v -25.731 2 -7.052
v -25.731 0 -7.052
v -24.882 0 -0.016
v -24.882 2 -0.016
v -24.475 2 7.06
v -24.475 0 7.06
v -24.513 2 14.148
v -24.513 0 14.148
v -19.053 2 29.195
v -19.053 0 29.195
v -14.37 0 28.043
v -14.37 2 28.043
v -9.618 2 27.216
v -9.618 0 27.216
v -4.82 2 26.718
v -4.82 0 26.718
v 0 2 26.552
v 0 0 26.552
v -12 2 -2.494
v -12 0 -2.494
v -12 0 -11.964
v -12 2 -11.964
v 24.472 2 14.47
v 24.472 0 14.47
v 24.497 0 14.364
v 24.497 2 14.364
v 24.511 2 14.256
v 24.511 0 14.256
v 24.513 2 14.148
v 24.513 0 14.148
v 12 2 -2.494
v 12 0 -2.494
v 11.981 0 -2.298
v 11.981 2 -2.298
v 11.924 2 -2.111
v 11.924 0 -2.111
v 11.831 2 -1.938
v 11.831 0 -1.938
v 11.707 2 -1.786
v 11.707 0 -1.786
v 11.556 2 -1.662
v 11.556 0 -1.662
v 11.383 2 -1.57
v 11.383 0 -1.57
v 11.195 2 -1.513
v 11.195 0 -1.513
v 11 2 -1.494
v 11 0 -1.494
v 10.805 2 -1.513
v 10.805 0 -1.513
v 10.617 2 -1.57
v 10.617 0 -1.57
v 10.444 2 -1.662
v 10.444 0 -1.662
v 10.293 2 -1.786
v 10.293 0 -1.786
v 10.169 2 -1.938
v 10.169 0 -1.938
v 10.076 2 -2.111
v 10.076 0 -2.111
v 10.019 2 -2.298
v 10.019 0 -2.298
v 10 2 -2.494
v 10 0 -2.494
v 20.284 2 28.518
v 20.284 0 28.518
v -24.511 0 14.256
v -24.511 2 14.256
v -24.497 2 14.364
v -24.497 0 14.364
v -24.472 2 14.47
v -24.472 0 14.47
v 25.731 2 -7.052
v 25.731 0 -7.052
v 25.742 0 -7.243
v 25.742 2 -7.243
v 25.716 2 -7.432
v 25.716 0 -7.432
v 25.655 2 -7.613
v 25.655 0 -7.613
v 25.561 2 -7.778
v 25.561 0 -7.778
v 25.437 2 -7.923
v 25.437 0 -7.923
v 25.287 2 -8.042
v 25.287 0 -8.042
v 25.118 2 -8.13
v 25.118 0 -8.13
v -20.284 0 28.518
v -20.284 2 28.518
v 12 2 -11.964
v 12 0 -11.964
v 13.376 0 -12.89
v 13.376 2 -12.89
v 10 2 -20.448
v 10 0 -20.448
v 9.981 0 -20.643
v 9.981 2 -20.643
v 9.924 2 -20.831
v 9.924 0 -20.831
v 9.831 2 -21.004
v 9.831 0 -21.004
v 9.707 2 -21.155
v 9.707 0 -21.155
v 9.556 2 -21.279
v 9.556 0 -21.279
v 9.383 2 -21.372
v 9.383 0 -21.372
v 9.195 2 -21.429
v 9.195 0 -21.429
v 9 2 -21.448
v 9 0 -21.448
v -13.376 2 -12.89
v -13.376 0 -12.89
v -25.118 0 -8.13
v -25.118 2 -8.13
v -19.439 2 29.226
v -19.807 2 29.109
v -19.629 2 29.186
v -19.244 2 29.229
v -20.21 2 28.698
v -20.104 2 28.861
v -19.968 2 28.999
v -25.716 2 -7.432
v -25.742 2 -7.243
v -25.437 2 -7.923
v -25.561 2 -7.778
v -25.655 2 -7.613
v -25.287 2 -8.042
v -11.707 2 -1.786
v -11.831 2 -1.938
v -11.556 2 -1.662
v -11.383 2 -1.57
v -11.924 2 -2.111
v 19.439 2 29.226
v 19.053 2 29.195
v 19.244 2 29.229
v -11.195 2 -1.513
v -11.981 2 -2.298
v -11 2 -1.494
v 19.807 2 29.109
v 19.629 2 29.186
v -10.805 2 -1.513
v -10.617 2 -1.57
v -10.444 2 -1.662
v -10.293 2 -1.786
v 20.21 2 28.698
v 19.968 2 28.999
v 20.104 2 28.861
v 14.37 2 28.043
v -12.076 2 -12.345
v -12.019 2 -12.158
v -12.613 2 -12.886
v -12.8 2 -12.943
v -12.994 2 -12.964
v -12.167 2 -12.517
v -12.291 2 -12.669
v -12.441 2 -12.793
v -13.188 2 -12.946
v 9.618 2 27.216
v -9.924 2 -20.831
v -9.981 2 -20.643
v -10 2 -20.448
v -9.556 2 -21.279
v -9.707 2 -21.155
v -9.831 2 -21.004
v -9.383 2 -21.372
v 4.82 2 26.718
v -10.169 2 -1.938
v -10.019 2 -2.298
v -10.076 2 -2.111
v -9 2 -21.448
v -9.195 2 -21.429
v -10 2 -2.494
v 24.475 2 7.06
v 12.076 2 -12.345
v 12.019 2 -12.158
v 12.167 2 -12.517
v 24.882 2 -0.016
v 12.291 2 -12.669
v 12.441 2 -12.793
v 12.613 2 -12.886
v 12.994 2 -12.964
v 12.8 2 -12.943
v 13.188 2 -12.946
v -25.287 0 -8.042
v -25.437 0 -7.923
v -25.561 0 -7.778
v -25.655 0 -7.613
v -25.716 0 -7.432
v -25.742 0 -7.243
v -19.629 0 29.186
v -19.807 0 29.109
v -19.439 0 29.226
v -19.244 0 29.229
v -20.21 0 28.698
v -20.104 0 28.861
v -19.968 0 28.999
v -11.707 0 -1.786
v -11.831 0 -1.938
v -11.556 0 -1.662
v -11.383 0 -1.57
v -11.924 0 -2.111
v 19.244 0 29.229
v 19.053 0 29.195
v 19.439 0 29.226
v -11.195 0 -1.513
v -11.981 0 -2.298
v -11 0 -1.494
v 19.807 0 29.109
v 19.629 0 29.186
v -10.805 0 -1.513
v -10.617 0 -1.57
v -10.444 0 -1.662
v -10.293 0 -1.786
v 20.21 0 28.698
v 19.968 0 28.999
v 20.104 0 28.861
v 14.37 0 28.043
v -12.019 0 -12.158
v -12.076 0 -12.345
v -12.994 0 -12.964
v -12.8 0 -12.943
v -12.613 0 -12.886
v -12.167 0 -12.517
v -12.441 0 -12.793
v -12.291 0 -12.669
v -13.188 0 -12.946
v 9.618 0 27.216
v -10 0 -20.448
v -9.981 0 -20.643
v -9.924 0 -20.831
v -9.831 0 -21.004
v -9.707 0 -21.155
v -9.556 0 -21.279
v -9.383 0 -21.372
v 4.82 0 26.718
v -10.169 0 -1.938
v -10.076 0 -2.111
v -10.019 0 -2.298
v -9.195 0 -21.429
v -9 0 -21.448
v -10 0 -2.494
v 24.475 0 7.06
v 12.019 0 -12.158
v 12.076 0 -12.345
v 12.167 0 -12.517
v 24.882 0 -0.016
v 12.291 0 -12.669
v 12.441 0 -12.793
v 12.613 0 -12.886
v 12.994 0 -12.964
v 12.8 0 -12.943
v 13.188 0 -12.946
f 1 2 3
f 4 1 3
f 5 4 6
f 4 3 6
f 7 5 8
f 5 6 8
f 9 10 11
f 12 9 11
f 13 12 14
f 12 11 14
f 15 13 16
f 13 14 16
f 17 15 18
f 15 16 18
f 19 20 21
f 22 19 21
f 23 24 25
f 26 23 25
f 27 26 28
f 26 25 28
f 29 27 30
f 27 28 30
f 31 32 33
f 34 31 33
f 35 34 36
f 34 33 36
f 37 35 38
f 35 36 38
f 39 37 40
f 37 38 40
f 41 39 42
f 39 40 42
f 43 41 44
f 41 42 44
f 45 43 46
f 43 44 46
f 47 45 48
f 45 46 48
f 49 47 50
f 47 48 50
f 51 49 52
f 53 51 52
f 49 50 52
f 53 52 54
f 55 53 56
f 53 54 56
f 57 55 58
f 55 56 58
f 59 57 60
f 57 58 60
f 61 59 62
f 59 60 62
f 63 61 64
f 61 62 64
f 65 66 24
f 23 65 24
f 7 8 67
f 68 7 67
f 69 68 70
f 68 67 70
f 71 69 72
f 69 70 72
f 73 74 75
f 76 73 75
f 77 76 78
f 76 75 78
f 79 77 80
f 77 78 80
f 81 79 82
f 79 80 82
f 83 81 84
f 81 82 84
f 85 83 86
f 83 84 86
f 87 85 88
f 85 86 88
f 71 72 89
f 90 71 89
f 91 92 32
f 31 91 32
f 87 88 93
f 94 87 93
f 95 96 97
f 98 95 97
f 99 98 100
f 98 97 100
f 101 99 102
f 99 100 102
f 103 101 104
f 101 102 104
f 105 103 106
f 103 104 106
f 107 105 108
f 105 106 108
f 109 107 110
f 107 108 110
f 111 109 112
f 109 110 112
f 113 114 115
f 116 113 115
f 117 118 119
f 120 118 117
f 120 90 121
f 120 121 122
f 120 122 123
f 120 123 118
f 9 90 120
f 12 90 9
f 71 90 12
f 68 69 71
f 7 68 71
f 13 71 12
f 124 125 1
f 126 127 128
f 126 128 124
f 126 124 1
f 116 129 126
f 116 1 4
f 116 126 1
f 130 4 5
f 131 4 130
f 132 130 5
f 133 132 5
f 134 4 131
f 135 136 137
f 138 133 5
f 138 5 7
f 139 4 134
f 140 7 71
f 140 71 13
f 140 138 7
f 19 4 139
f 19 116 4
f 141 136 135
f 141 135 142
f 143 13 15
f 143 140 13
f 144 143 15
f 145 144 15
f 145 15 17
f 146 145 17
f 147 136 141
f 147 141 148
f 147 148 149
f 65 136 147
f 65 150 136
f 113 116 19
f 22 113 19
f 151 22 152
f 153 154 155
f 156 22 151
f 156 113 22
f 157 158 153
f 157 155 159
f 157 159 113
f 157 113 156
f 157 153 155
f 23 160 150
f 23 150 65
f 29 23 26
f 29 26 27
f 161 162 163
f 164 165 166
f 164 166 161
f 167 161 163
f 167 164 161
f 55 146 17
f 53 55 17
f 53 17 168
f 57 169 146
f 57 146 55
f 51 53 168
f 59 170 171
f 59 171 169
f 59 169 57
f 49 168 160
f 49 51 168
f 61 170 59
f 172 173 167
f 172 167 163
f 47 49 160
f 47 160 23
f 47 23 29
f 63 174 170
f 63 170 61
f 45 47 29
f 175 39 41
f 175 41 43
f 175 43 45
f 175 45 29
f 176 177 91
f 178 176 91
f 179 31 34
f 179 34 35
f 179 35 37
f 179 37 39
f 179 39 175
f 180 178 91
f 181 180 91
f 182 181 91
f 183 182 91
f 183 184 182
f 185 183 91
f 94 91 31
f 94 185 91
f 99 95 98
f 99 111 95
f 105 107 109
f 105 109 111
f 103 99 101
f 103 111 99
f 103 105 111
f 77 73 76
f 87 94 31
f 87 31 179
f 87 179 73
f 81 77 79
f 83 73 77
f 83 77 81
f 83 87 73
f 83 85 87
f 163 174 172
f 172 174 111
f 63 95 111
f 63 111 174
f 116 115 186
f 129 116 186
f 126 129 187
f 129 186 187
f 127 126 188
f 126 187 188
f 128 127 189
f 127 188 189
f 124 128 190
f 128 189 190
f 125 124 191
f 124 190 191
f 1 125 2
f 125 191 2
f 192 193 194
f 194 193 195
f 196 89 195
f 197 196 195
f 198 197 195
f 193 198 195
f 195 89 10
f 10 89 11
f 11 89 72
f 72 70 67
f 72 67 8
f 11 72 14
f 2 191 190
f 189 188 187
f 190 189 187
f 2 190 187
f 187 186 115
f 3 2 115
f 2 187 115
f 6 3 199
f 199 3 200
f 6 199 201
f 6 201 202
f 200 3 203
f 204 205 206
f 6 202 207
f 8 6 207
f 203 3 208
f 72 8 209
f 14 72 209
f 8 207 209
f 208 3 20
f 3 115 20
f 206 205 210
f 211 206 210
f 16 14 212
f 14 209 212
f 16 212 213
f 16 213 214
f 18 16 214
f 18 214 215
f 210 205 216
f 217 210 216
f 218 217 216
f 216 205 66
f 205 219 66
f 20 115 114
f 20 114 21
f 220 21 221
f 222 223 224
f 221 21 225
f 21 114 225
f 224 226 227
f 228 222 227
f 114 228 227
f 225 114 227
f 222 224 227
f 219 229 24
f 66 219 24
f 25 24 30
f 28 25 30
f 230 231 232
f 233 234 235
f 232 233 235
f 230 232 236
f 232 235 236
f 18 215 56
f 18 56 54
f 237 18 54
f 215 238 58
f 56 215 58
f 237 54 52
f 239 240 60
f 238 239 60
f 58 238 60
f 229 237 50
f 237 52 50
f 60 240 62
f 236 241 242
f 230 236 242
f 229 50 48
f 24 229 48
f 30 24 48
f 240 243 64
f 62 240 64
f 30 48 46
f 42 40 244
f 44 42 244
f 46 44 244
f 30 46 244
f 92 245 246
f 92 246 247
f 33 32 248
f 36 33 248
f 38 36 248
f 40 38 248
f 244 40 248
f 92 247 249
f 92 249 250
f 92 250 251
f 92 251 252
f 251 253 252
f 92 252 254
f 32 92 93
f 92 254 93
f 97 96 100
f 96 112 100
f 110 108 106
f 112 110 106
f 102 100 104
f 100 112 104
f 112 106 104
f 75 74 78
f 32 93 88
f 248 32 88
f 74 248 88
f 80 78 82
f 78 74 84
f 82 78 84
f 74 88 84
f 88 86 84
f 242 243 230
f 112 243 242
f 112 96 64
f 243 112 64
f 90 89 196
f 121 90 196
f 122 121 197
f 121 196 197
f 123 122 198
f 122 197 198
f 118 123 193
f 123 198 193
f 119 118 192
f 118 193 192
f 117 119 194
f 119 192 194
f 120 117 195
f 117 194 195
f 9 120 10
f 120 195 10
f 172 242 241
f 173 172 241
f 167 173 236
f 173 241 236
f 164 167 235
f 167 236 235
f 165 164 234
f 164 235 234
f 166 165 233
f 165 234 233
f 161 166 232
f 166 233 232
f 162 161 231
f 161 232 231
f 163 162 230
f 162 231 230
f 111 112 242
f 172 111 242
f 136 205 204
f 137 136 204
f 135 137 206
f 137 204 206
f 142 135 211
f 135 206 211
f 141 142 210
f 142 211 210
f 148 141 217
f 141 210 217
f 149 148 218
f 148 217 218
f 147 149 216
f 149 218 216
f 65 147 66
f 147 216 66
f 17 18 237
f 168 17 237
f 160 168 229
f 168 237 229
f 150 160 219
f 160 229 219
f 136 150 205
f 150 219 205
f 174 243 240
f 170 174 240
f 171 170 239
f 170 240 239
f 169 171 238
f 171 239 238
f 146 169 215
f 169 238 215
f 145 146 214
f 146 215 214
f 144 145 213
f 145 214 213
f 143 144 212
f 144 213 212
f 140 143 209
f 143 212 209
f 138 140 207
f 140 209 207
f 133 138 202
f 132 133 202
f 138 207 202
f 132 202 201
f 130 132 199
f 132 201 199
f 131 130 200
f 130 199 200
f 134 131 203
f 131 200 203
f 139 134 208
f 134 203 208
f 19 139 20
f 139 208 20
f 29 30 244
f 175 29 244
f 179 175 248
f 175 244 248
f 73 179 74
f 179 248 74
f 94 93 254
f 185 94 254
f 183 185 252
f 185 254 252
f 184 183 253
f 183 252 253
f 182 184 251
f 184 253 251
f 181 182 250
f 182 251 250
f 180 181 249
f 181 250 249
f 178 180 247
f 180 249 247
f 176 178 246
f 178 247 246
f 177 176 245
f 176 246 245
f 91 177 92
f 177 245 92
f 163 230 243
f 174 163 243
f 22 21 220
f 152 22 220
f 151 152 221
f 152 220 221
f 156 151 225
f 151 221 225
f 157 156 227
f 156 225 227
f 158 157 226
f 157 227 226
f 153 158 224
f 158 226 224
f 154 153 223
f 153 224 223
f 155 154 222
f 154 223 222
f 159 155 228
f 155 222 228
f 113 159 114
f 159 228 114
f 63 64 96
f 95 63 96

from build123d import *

# Parameters (mm, degrees)
RESSALTO_EXTRUS_O1_DEPTH = 2


with BuildPart() as part:
    # Esboço1 → Ressalto-extrusão1 (new body)
    with BuildSketch(Plane(origin=(0, 0, 0), x_dir=(1, 0, 0), z_dir=(0, 1, 0))):
        with BuildLine():
            Line((9, 21.44797145), (-9, 21.44797145))
            ThreePointArc((-9, 21.44797145), (-9.707106781, 21.155078231), (-10, 20.44797145))
            Line((-10, 20.44797145), (-10, 2.4935203))
            ThreePointArc((-10, 2.4935203), (-11, 1.4935203), (-12, 2.4935203))
            Line((-12, 2.4935203), (-12, 11.963556295))
            ThreePointArc((-12, 11.963556295), (-12.441287452, 12.792917669), (-13.375680577, 12.890305508))
            Line((-13.375680577, 12.890305508), (-25.118348649, 8.130126323))
            ThreePointArc((-25.118348649, 8.130126323), (-25.611934385, 7.697721197), (-25.731213115, 7.052450978))
            ThreePointArc((-25.731213115, 7.052450978), (-24.623016259, -3.51887647), (-24.513147024, -14.147563739))
            ThreePointArc((-24.513147024, -14.147563739), (-24.505828612, -14.310453824), (-24.472135955, -14.469989225))
            Line((-24.472135955, -14.469989225), (-20.283702113, -28.518423408))
            ThreePointArc((-20.283702113, -28.518423408), (-19.807170843, -29.108999363), (-19.053198713, -29.194953058))
            ThreePointArc((-19.053198713, -29.194953058), (-9.617814606, -27.215907789), (0, -26.55202855))
            ThreePointArc((0, -26.55202855), (9.617814606, -27.215907789), (19.053198713, -29.194953058))
            ThreePointArc((19.053198713, -29.194953058), (19.807170843, -29.108999363), (20.283702113, -28.518423408))
            Line((20.283702113, -28.518423408), (24.472135955, -14.469989225))
            ThreePointArc((24.472135955, -14.469989225), (24.505828612, -14.310453824), (24.513147024, -14.147563739))
            ThreePointArc((24.513147024, -14.147563739), (24.623016259, -3.51887647), (25.731213115, 7.052450978))
            ThreePointArc((25.731213115, 7.052450978), (25.611934385, 7.697721197), (25.118348649, 8.130126323))
            Line((25.118348649, 8.130126323), (13.375680577, 12.890305508))
            ThreePointArc((13.375680577, 12.890305508), (12.441287452, 12.792917669), (12, 11.963556295))
            Line((12, 11.963556295), (12, 2.4935203))
            ThreePointArc((12, 2.4935203), (11, 1.4935203), (10, 2.4935203))
            Line((10, 2.4935203), (10, 20.44797145))
            ThreePointArc((10, 20.44797145), (9.707106781, 21.155078231), (9, 21.44797145))
        make_face()
    extrude(amount=RESSALTO_EXTRUS_O1_DEPTH)


solid = part.part
